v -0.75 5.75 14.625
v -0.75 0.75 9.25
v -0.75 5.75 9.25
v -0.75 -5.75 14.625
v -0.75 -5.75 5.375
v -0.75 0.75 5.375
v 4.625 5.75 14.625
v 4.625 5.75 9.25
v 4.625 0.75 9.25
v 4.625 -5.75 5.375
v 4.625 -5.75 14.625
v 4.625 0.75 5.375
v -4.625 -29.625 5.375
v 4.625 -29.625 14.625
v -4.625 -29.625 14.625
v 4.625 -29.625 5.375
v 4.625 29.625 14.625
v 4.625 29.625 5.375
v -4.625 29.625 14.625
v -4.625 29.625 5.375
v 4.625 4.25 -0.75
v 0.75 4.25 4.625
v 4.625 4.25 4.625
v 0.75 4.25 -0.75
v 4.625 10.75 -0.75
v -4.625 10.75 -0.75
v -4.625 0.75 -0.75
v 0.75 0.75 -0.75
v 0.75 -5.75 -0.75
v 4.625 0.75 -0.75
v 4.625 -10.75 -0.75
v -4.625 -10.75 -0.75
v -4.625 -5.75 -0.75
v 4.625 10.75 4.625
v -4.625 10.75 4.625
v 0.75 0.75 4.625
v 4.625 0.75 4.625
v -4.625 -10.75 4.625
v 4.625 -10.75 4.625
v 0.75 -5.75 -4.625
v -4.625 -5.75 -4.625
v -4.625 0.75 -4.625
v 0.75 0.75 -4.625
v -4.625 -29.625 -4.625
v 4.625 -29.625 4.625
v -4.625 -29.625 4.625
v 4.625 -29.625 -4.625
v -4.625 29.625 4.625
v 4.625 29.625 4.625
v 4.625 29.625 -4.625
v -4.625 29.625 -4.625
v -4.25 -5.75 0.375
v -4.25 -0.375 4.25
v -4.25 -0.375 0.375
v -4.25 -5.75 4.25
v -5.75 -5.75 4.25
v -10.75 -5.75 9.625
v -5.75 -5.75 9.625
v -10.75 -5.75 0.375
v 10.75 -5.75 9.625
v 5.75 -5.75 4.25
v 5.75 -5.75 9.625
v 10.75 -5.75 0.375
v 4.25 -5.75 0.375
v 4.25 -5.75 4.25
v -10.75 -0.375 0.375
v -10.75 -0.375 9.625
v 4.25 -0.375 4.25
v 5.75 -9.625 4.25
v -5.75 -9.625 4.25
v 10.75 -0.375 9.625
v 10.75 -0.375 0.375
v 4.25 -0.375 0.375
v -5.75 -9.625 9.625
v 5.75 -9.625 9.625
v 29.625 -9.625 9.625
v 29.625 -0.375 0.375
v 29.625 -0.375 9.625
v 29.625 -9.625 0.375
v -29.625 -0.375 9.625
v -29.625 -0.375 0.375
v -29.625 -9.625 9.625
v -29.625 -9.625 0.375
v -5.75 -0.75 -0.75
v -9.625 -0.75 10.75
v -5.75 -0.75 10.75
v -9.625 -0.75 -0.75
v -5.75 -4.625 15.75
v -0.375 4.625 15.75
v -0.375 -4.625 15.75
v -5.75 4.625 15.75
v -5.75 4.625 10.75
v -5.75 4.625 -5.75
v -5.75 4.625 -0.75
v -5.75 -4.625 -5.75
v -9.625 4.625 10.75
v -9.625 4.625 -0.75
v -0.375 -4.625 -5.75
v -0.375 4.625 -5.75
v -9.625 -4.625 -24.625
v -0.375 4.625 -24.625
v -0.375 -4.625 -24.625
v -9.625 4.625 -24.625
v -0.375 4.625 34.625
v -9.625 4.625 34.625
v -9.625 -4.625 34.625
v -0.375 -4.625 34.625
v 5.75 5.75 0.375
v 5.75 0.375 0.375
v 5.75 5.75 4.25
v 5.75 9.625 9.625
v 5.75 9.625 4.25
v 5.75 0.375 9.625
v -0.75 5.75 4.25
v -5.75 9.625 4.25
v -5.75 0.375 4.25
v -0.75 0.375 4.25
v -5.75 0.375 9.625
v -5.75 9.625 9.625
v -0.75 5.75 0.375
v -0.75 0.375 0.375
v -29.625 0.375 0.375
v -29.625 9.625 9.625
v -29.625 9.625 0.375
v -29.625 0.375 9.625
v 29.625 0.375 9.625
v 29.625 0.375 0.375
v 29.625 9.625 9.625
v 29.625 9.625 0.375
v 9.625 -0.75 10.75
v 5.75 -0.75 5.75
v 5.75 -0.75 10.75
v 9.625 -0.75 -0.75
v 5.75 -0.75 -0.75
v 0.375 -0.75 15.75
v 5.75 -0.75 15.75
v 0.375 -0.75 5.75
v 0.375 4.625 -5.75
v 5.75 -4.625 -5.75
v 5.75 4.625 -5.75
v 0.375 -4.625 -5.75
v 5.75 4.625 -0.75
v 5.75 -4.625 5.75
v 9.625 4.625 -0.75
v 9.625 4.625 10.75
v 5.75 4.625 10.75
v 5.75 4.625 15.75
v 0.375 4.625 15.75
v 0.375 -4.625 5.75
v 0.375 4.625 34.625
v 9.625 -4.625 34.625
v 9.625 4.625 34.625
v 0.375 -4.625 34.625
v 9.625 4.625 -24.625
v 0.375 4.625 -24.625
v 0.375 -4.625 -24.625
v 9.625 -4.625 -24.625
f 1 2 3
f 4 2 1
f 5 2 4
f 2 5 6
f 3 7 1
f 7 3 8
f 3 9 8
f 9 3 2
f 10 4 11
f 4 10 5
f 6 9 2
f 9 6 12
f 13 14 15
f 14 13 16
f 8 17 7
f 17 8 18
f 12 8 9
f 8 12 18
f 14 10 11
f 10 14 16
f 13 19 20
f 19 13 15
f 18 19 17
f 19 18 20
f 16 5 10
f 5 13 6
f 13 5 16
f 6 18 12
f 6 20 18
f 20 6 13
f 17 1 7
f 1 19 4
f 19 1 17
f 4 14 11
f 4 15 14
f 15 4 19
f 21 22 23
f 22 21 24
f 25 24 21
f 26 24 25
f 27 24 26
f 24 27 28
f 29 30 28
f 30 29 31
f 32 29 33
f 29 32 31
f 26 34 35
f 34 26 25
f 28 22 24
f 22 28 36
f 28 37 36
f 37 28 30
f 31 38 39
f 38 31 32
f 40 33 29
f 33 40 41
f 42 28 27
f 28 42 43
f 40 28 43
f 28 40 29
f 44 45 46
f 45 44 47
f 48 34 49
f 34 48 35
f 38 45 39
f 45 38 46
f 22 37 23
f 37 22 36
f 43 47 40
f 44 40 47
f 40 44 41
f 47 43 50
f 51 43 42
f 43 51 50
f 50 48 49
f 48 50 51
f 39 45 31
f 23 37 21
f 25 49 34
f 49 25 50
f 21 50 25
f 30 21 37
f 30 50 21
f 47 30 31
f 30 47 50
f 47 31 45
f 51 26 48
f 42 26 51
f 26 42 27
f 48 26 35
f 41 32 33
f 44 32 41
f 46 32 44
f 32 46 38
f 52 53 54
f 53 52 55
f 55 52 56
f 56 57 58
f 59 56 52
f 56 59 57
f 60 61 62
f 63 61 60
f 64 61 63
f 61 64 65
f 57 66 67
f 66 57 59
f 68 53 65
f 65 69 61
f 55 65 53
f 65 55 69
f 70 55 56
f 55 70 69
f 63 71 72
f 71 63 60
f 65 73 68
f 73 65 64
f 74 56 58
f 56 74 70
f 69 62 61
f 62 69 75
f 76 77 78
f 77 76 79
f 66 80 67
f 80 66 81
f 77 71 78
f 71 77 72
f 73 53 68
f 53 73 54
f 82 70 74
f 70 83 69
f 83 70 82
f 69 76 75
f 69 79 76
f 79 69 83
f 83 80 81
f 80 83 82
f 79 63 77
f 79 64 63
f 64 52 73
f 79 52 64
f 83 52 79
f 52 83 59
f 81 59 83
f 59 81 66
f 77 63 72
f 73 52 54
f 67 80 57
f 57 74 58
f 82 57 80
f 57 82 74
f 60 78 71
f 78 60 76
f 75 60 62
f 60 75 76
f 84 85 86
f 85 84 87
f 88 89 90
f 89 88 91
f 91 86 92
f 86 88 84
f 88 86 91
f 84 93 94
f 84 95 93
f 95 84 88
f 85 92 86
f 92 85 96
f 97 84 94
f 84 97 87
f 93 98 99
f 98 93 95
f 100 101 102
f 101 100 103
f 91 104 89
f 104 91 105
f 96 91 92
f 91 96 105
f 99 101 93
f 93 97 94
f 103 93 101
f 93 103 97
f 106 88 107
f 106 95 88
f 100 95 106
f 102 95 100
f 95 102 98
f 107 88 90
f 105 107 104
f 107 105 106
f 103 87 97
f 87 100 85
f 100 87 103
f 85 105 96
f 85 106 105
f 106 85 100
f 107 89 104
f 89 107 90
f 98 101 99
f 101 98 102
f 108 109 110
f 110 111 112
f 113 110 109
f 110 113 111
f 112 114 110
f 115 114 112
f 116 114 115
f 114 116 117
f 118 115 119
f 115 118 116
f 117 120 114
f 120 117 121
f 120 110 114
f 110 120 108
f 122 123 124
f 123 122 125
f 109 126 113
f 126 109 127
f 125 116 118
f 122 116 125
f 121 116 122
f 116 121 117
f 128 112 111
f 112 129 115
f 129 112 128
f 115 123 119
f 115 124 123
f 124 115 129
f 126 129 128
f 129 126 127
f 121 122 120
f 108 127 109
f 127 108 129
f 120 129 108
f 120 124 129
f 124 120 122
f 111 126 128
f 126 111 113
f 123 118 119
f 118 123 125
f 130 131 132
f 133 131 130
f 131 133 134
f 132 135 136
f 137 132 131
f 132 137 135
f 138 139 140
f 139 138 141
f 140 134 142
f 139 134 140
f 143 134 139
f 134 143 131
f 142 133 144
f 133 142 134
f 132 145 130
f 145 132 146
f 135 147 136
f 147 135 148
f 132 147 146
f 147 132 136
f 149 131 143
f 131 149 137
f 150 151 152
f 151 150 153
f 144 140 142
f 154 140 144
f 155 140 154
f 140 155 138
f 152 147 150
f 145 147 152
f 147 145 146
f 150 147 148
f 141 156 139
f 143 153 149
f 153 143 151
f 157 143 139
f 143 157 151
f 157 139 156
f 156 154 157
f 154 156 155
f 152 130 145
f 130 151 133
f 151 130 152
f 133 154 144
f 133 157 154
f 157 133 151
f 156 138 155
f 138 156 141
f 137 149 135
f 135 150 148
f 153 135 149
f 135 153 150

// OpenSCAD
Unit=5;
Slack=1.5;
Laengde=12*Unit;
Bredde=2*Unit;
keys = [[0,1,2,0,0,0,0,0],
        [1,2,2,1,1,1,1,1],
        [2,1,1,2,0,1,1,0],
        [0,2,1,0,0,1,1,0],
        [2,1,2,2,0,0,1,0],
        [1,2,2,1,1,1,0,0]];
        
module cut(key){
    for (i = [0:3]) {
        if (key[i]!=0) {
            translate([(i)*Unit,-Unit,0])
            cube([Unit+Slack,key[i]*Unit+Slack,Unit+Slack],center=false);
        }
    }
    for (i = [4:7]) {
        if (key[i]!=0) {
            translate([(i-4)*Unit,-Unit,-Unit])
            cube([Unit+Slack,key[i]*Unit+Slack,Unit+Slack],center=false);
        }
    }
}

module pind(){
cube([Laengde-Slack/2,Bredde-Slack/2,Bredde-Slack/2], center = true);
} 

module stick(key) {
    difference(){
    pind();
    translate([-2*Unit-Slack/2,-Slack/2,-Slack/2])
        cut(key);
    }
}

translate([0,0,2*Unit])
  rotate(-90,[0,0,1])      
      rotate(-90,[1,0,0])      
        stick(keys[0]); // 1

translate([0,0,0*Unit])
  rotate(-90,[0,0,1])      
      rotate(0,[1,0,0])      
        stick(keys[4]); // 5

translate([0,-1*Unit,1*Unit])
  rotate(0,[0,0,1])      
      rotate(-90,[1,0,0])      
        stick(keys[2]); // 3

translate([-1*Unit,0*Unit,1*Unit])
  rotate(90,[0,1,0])      
      rotate(-90,[1,0,0])      
        stick(keys[1]); // 2

translate([0,1*Unit,1*Unit])
  rotate(180,[0,1,0])      
      rotate(90,[1,0,0])      
        stick(keys[3]); // 4

translate([1*Unit,0*Unit,1*Unit])
  rotate(-90,[0,0,1])
    rotate(-90,[0,1,0])      
      rotate(-0,[1,0,0])      
            stick(keys[5]); // 6
